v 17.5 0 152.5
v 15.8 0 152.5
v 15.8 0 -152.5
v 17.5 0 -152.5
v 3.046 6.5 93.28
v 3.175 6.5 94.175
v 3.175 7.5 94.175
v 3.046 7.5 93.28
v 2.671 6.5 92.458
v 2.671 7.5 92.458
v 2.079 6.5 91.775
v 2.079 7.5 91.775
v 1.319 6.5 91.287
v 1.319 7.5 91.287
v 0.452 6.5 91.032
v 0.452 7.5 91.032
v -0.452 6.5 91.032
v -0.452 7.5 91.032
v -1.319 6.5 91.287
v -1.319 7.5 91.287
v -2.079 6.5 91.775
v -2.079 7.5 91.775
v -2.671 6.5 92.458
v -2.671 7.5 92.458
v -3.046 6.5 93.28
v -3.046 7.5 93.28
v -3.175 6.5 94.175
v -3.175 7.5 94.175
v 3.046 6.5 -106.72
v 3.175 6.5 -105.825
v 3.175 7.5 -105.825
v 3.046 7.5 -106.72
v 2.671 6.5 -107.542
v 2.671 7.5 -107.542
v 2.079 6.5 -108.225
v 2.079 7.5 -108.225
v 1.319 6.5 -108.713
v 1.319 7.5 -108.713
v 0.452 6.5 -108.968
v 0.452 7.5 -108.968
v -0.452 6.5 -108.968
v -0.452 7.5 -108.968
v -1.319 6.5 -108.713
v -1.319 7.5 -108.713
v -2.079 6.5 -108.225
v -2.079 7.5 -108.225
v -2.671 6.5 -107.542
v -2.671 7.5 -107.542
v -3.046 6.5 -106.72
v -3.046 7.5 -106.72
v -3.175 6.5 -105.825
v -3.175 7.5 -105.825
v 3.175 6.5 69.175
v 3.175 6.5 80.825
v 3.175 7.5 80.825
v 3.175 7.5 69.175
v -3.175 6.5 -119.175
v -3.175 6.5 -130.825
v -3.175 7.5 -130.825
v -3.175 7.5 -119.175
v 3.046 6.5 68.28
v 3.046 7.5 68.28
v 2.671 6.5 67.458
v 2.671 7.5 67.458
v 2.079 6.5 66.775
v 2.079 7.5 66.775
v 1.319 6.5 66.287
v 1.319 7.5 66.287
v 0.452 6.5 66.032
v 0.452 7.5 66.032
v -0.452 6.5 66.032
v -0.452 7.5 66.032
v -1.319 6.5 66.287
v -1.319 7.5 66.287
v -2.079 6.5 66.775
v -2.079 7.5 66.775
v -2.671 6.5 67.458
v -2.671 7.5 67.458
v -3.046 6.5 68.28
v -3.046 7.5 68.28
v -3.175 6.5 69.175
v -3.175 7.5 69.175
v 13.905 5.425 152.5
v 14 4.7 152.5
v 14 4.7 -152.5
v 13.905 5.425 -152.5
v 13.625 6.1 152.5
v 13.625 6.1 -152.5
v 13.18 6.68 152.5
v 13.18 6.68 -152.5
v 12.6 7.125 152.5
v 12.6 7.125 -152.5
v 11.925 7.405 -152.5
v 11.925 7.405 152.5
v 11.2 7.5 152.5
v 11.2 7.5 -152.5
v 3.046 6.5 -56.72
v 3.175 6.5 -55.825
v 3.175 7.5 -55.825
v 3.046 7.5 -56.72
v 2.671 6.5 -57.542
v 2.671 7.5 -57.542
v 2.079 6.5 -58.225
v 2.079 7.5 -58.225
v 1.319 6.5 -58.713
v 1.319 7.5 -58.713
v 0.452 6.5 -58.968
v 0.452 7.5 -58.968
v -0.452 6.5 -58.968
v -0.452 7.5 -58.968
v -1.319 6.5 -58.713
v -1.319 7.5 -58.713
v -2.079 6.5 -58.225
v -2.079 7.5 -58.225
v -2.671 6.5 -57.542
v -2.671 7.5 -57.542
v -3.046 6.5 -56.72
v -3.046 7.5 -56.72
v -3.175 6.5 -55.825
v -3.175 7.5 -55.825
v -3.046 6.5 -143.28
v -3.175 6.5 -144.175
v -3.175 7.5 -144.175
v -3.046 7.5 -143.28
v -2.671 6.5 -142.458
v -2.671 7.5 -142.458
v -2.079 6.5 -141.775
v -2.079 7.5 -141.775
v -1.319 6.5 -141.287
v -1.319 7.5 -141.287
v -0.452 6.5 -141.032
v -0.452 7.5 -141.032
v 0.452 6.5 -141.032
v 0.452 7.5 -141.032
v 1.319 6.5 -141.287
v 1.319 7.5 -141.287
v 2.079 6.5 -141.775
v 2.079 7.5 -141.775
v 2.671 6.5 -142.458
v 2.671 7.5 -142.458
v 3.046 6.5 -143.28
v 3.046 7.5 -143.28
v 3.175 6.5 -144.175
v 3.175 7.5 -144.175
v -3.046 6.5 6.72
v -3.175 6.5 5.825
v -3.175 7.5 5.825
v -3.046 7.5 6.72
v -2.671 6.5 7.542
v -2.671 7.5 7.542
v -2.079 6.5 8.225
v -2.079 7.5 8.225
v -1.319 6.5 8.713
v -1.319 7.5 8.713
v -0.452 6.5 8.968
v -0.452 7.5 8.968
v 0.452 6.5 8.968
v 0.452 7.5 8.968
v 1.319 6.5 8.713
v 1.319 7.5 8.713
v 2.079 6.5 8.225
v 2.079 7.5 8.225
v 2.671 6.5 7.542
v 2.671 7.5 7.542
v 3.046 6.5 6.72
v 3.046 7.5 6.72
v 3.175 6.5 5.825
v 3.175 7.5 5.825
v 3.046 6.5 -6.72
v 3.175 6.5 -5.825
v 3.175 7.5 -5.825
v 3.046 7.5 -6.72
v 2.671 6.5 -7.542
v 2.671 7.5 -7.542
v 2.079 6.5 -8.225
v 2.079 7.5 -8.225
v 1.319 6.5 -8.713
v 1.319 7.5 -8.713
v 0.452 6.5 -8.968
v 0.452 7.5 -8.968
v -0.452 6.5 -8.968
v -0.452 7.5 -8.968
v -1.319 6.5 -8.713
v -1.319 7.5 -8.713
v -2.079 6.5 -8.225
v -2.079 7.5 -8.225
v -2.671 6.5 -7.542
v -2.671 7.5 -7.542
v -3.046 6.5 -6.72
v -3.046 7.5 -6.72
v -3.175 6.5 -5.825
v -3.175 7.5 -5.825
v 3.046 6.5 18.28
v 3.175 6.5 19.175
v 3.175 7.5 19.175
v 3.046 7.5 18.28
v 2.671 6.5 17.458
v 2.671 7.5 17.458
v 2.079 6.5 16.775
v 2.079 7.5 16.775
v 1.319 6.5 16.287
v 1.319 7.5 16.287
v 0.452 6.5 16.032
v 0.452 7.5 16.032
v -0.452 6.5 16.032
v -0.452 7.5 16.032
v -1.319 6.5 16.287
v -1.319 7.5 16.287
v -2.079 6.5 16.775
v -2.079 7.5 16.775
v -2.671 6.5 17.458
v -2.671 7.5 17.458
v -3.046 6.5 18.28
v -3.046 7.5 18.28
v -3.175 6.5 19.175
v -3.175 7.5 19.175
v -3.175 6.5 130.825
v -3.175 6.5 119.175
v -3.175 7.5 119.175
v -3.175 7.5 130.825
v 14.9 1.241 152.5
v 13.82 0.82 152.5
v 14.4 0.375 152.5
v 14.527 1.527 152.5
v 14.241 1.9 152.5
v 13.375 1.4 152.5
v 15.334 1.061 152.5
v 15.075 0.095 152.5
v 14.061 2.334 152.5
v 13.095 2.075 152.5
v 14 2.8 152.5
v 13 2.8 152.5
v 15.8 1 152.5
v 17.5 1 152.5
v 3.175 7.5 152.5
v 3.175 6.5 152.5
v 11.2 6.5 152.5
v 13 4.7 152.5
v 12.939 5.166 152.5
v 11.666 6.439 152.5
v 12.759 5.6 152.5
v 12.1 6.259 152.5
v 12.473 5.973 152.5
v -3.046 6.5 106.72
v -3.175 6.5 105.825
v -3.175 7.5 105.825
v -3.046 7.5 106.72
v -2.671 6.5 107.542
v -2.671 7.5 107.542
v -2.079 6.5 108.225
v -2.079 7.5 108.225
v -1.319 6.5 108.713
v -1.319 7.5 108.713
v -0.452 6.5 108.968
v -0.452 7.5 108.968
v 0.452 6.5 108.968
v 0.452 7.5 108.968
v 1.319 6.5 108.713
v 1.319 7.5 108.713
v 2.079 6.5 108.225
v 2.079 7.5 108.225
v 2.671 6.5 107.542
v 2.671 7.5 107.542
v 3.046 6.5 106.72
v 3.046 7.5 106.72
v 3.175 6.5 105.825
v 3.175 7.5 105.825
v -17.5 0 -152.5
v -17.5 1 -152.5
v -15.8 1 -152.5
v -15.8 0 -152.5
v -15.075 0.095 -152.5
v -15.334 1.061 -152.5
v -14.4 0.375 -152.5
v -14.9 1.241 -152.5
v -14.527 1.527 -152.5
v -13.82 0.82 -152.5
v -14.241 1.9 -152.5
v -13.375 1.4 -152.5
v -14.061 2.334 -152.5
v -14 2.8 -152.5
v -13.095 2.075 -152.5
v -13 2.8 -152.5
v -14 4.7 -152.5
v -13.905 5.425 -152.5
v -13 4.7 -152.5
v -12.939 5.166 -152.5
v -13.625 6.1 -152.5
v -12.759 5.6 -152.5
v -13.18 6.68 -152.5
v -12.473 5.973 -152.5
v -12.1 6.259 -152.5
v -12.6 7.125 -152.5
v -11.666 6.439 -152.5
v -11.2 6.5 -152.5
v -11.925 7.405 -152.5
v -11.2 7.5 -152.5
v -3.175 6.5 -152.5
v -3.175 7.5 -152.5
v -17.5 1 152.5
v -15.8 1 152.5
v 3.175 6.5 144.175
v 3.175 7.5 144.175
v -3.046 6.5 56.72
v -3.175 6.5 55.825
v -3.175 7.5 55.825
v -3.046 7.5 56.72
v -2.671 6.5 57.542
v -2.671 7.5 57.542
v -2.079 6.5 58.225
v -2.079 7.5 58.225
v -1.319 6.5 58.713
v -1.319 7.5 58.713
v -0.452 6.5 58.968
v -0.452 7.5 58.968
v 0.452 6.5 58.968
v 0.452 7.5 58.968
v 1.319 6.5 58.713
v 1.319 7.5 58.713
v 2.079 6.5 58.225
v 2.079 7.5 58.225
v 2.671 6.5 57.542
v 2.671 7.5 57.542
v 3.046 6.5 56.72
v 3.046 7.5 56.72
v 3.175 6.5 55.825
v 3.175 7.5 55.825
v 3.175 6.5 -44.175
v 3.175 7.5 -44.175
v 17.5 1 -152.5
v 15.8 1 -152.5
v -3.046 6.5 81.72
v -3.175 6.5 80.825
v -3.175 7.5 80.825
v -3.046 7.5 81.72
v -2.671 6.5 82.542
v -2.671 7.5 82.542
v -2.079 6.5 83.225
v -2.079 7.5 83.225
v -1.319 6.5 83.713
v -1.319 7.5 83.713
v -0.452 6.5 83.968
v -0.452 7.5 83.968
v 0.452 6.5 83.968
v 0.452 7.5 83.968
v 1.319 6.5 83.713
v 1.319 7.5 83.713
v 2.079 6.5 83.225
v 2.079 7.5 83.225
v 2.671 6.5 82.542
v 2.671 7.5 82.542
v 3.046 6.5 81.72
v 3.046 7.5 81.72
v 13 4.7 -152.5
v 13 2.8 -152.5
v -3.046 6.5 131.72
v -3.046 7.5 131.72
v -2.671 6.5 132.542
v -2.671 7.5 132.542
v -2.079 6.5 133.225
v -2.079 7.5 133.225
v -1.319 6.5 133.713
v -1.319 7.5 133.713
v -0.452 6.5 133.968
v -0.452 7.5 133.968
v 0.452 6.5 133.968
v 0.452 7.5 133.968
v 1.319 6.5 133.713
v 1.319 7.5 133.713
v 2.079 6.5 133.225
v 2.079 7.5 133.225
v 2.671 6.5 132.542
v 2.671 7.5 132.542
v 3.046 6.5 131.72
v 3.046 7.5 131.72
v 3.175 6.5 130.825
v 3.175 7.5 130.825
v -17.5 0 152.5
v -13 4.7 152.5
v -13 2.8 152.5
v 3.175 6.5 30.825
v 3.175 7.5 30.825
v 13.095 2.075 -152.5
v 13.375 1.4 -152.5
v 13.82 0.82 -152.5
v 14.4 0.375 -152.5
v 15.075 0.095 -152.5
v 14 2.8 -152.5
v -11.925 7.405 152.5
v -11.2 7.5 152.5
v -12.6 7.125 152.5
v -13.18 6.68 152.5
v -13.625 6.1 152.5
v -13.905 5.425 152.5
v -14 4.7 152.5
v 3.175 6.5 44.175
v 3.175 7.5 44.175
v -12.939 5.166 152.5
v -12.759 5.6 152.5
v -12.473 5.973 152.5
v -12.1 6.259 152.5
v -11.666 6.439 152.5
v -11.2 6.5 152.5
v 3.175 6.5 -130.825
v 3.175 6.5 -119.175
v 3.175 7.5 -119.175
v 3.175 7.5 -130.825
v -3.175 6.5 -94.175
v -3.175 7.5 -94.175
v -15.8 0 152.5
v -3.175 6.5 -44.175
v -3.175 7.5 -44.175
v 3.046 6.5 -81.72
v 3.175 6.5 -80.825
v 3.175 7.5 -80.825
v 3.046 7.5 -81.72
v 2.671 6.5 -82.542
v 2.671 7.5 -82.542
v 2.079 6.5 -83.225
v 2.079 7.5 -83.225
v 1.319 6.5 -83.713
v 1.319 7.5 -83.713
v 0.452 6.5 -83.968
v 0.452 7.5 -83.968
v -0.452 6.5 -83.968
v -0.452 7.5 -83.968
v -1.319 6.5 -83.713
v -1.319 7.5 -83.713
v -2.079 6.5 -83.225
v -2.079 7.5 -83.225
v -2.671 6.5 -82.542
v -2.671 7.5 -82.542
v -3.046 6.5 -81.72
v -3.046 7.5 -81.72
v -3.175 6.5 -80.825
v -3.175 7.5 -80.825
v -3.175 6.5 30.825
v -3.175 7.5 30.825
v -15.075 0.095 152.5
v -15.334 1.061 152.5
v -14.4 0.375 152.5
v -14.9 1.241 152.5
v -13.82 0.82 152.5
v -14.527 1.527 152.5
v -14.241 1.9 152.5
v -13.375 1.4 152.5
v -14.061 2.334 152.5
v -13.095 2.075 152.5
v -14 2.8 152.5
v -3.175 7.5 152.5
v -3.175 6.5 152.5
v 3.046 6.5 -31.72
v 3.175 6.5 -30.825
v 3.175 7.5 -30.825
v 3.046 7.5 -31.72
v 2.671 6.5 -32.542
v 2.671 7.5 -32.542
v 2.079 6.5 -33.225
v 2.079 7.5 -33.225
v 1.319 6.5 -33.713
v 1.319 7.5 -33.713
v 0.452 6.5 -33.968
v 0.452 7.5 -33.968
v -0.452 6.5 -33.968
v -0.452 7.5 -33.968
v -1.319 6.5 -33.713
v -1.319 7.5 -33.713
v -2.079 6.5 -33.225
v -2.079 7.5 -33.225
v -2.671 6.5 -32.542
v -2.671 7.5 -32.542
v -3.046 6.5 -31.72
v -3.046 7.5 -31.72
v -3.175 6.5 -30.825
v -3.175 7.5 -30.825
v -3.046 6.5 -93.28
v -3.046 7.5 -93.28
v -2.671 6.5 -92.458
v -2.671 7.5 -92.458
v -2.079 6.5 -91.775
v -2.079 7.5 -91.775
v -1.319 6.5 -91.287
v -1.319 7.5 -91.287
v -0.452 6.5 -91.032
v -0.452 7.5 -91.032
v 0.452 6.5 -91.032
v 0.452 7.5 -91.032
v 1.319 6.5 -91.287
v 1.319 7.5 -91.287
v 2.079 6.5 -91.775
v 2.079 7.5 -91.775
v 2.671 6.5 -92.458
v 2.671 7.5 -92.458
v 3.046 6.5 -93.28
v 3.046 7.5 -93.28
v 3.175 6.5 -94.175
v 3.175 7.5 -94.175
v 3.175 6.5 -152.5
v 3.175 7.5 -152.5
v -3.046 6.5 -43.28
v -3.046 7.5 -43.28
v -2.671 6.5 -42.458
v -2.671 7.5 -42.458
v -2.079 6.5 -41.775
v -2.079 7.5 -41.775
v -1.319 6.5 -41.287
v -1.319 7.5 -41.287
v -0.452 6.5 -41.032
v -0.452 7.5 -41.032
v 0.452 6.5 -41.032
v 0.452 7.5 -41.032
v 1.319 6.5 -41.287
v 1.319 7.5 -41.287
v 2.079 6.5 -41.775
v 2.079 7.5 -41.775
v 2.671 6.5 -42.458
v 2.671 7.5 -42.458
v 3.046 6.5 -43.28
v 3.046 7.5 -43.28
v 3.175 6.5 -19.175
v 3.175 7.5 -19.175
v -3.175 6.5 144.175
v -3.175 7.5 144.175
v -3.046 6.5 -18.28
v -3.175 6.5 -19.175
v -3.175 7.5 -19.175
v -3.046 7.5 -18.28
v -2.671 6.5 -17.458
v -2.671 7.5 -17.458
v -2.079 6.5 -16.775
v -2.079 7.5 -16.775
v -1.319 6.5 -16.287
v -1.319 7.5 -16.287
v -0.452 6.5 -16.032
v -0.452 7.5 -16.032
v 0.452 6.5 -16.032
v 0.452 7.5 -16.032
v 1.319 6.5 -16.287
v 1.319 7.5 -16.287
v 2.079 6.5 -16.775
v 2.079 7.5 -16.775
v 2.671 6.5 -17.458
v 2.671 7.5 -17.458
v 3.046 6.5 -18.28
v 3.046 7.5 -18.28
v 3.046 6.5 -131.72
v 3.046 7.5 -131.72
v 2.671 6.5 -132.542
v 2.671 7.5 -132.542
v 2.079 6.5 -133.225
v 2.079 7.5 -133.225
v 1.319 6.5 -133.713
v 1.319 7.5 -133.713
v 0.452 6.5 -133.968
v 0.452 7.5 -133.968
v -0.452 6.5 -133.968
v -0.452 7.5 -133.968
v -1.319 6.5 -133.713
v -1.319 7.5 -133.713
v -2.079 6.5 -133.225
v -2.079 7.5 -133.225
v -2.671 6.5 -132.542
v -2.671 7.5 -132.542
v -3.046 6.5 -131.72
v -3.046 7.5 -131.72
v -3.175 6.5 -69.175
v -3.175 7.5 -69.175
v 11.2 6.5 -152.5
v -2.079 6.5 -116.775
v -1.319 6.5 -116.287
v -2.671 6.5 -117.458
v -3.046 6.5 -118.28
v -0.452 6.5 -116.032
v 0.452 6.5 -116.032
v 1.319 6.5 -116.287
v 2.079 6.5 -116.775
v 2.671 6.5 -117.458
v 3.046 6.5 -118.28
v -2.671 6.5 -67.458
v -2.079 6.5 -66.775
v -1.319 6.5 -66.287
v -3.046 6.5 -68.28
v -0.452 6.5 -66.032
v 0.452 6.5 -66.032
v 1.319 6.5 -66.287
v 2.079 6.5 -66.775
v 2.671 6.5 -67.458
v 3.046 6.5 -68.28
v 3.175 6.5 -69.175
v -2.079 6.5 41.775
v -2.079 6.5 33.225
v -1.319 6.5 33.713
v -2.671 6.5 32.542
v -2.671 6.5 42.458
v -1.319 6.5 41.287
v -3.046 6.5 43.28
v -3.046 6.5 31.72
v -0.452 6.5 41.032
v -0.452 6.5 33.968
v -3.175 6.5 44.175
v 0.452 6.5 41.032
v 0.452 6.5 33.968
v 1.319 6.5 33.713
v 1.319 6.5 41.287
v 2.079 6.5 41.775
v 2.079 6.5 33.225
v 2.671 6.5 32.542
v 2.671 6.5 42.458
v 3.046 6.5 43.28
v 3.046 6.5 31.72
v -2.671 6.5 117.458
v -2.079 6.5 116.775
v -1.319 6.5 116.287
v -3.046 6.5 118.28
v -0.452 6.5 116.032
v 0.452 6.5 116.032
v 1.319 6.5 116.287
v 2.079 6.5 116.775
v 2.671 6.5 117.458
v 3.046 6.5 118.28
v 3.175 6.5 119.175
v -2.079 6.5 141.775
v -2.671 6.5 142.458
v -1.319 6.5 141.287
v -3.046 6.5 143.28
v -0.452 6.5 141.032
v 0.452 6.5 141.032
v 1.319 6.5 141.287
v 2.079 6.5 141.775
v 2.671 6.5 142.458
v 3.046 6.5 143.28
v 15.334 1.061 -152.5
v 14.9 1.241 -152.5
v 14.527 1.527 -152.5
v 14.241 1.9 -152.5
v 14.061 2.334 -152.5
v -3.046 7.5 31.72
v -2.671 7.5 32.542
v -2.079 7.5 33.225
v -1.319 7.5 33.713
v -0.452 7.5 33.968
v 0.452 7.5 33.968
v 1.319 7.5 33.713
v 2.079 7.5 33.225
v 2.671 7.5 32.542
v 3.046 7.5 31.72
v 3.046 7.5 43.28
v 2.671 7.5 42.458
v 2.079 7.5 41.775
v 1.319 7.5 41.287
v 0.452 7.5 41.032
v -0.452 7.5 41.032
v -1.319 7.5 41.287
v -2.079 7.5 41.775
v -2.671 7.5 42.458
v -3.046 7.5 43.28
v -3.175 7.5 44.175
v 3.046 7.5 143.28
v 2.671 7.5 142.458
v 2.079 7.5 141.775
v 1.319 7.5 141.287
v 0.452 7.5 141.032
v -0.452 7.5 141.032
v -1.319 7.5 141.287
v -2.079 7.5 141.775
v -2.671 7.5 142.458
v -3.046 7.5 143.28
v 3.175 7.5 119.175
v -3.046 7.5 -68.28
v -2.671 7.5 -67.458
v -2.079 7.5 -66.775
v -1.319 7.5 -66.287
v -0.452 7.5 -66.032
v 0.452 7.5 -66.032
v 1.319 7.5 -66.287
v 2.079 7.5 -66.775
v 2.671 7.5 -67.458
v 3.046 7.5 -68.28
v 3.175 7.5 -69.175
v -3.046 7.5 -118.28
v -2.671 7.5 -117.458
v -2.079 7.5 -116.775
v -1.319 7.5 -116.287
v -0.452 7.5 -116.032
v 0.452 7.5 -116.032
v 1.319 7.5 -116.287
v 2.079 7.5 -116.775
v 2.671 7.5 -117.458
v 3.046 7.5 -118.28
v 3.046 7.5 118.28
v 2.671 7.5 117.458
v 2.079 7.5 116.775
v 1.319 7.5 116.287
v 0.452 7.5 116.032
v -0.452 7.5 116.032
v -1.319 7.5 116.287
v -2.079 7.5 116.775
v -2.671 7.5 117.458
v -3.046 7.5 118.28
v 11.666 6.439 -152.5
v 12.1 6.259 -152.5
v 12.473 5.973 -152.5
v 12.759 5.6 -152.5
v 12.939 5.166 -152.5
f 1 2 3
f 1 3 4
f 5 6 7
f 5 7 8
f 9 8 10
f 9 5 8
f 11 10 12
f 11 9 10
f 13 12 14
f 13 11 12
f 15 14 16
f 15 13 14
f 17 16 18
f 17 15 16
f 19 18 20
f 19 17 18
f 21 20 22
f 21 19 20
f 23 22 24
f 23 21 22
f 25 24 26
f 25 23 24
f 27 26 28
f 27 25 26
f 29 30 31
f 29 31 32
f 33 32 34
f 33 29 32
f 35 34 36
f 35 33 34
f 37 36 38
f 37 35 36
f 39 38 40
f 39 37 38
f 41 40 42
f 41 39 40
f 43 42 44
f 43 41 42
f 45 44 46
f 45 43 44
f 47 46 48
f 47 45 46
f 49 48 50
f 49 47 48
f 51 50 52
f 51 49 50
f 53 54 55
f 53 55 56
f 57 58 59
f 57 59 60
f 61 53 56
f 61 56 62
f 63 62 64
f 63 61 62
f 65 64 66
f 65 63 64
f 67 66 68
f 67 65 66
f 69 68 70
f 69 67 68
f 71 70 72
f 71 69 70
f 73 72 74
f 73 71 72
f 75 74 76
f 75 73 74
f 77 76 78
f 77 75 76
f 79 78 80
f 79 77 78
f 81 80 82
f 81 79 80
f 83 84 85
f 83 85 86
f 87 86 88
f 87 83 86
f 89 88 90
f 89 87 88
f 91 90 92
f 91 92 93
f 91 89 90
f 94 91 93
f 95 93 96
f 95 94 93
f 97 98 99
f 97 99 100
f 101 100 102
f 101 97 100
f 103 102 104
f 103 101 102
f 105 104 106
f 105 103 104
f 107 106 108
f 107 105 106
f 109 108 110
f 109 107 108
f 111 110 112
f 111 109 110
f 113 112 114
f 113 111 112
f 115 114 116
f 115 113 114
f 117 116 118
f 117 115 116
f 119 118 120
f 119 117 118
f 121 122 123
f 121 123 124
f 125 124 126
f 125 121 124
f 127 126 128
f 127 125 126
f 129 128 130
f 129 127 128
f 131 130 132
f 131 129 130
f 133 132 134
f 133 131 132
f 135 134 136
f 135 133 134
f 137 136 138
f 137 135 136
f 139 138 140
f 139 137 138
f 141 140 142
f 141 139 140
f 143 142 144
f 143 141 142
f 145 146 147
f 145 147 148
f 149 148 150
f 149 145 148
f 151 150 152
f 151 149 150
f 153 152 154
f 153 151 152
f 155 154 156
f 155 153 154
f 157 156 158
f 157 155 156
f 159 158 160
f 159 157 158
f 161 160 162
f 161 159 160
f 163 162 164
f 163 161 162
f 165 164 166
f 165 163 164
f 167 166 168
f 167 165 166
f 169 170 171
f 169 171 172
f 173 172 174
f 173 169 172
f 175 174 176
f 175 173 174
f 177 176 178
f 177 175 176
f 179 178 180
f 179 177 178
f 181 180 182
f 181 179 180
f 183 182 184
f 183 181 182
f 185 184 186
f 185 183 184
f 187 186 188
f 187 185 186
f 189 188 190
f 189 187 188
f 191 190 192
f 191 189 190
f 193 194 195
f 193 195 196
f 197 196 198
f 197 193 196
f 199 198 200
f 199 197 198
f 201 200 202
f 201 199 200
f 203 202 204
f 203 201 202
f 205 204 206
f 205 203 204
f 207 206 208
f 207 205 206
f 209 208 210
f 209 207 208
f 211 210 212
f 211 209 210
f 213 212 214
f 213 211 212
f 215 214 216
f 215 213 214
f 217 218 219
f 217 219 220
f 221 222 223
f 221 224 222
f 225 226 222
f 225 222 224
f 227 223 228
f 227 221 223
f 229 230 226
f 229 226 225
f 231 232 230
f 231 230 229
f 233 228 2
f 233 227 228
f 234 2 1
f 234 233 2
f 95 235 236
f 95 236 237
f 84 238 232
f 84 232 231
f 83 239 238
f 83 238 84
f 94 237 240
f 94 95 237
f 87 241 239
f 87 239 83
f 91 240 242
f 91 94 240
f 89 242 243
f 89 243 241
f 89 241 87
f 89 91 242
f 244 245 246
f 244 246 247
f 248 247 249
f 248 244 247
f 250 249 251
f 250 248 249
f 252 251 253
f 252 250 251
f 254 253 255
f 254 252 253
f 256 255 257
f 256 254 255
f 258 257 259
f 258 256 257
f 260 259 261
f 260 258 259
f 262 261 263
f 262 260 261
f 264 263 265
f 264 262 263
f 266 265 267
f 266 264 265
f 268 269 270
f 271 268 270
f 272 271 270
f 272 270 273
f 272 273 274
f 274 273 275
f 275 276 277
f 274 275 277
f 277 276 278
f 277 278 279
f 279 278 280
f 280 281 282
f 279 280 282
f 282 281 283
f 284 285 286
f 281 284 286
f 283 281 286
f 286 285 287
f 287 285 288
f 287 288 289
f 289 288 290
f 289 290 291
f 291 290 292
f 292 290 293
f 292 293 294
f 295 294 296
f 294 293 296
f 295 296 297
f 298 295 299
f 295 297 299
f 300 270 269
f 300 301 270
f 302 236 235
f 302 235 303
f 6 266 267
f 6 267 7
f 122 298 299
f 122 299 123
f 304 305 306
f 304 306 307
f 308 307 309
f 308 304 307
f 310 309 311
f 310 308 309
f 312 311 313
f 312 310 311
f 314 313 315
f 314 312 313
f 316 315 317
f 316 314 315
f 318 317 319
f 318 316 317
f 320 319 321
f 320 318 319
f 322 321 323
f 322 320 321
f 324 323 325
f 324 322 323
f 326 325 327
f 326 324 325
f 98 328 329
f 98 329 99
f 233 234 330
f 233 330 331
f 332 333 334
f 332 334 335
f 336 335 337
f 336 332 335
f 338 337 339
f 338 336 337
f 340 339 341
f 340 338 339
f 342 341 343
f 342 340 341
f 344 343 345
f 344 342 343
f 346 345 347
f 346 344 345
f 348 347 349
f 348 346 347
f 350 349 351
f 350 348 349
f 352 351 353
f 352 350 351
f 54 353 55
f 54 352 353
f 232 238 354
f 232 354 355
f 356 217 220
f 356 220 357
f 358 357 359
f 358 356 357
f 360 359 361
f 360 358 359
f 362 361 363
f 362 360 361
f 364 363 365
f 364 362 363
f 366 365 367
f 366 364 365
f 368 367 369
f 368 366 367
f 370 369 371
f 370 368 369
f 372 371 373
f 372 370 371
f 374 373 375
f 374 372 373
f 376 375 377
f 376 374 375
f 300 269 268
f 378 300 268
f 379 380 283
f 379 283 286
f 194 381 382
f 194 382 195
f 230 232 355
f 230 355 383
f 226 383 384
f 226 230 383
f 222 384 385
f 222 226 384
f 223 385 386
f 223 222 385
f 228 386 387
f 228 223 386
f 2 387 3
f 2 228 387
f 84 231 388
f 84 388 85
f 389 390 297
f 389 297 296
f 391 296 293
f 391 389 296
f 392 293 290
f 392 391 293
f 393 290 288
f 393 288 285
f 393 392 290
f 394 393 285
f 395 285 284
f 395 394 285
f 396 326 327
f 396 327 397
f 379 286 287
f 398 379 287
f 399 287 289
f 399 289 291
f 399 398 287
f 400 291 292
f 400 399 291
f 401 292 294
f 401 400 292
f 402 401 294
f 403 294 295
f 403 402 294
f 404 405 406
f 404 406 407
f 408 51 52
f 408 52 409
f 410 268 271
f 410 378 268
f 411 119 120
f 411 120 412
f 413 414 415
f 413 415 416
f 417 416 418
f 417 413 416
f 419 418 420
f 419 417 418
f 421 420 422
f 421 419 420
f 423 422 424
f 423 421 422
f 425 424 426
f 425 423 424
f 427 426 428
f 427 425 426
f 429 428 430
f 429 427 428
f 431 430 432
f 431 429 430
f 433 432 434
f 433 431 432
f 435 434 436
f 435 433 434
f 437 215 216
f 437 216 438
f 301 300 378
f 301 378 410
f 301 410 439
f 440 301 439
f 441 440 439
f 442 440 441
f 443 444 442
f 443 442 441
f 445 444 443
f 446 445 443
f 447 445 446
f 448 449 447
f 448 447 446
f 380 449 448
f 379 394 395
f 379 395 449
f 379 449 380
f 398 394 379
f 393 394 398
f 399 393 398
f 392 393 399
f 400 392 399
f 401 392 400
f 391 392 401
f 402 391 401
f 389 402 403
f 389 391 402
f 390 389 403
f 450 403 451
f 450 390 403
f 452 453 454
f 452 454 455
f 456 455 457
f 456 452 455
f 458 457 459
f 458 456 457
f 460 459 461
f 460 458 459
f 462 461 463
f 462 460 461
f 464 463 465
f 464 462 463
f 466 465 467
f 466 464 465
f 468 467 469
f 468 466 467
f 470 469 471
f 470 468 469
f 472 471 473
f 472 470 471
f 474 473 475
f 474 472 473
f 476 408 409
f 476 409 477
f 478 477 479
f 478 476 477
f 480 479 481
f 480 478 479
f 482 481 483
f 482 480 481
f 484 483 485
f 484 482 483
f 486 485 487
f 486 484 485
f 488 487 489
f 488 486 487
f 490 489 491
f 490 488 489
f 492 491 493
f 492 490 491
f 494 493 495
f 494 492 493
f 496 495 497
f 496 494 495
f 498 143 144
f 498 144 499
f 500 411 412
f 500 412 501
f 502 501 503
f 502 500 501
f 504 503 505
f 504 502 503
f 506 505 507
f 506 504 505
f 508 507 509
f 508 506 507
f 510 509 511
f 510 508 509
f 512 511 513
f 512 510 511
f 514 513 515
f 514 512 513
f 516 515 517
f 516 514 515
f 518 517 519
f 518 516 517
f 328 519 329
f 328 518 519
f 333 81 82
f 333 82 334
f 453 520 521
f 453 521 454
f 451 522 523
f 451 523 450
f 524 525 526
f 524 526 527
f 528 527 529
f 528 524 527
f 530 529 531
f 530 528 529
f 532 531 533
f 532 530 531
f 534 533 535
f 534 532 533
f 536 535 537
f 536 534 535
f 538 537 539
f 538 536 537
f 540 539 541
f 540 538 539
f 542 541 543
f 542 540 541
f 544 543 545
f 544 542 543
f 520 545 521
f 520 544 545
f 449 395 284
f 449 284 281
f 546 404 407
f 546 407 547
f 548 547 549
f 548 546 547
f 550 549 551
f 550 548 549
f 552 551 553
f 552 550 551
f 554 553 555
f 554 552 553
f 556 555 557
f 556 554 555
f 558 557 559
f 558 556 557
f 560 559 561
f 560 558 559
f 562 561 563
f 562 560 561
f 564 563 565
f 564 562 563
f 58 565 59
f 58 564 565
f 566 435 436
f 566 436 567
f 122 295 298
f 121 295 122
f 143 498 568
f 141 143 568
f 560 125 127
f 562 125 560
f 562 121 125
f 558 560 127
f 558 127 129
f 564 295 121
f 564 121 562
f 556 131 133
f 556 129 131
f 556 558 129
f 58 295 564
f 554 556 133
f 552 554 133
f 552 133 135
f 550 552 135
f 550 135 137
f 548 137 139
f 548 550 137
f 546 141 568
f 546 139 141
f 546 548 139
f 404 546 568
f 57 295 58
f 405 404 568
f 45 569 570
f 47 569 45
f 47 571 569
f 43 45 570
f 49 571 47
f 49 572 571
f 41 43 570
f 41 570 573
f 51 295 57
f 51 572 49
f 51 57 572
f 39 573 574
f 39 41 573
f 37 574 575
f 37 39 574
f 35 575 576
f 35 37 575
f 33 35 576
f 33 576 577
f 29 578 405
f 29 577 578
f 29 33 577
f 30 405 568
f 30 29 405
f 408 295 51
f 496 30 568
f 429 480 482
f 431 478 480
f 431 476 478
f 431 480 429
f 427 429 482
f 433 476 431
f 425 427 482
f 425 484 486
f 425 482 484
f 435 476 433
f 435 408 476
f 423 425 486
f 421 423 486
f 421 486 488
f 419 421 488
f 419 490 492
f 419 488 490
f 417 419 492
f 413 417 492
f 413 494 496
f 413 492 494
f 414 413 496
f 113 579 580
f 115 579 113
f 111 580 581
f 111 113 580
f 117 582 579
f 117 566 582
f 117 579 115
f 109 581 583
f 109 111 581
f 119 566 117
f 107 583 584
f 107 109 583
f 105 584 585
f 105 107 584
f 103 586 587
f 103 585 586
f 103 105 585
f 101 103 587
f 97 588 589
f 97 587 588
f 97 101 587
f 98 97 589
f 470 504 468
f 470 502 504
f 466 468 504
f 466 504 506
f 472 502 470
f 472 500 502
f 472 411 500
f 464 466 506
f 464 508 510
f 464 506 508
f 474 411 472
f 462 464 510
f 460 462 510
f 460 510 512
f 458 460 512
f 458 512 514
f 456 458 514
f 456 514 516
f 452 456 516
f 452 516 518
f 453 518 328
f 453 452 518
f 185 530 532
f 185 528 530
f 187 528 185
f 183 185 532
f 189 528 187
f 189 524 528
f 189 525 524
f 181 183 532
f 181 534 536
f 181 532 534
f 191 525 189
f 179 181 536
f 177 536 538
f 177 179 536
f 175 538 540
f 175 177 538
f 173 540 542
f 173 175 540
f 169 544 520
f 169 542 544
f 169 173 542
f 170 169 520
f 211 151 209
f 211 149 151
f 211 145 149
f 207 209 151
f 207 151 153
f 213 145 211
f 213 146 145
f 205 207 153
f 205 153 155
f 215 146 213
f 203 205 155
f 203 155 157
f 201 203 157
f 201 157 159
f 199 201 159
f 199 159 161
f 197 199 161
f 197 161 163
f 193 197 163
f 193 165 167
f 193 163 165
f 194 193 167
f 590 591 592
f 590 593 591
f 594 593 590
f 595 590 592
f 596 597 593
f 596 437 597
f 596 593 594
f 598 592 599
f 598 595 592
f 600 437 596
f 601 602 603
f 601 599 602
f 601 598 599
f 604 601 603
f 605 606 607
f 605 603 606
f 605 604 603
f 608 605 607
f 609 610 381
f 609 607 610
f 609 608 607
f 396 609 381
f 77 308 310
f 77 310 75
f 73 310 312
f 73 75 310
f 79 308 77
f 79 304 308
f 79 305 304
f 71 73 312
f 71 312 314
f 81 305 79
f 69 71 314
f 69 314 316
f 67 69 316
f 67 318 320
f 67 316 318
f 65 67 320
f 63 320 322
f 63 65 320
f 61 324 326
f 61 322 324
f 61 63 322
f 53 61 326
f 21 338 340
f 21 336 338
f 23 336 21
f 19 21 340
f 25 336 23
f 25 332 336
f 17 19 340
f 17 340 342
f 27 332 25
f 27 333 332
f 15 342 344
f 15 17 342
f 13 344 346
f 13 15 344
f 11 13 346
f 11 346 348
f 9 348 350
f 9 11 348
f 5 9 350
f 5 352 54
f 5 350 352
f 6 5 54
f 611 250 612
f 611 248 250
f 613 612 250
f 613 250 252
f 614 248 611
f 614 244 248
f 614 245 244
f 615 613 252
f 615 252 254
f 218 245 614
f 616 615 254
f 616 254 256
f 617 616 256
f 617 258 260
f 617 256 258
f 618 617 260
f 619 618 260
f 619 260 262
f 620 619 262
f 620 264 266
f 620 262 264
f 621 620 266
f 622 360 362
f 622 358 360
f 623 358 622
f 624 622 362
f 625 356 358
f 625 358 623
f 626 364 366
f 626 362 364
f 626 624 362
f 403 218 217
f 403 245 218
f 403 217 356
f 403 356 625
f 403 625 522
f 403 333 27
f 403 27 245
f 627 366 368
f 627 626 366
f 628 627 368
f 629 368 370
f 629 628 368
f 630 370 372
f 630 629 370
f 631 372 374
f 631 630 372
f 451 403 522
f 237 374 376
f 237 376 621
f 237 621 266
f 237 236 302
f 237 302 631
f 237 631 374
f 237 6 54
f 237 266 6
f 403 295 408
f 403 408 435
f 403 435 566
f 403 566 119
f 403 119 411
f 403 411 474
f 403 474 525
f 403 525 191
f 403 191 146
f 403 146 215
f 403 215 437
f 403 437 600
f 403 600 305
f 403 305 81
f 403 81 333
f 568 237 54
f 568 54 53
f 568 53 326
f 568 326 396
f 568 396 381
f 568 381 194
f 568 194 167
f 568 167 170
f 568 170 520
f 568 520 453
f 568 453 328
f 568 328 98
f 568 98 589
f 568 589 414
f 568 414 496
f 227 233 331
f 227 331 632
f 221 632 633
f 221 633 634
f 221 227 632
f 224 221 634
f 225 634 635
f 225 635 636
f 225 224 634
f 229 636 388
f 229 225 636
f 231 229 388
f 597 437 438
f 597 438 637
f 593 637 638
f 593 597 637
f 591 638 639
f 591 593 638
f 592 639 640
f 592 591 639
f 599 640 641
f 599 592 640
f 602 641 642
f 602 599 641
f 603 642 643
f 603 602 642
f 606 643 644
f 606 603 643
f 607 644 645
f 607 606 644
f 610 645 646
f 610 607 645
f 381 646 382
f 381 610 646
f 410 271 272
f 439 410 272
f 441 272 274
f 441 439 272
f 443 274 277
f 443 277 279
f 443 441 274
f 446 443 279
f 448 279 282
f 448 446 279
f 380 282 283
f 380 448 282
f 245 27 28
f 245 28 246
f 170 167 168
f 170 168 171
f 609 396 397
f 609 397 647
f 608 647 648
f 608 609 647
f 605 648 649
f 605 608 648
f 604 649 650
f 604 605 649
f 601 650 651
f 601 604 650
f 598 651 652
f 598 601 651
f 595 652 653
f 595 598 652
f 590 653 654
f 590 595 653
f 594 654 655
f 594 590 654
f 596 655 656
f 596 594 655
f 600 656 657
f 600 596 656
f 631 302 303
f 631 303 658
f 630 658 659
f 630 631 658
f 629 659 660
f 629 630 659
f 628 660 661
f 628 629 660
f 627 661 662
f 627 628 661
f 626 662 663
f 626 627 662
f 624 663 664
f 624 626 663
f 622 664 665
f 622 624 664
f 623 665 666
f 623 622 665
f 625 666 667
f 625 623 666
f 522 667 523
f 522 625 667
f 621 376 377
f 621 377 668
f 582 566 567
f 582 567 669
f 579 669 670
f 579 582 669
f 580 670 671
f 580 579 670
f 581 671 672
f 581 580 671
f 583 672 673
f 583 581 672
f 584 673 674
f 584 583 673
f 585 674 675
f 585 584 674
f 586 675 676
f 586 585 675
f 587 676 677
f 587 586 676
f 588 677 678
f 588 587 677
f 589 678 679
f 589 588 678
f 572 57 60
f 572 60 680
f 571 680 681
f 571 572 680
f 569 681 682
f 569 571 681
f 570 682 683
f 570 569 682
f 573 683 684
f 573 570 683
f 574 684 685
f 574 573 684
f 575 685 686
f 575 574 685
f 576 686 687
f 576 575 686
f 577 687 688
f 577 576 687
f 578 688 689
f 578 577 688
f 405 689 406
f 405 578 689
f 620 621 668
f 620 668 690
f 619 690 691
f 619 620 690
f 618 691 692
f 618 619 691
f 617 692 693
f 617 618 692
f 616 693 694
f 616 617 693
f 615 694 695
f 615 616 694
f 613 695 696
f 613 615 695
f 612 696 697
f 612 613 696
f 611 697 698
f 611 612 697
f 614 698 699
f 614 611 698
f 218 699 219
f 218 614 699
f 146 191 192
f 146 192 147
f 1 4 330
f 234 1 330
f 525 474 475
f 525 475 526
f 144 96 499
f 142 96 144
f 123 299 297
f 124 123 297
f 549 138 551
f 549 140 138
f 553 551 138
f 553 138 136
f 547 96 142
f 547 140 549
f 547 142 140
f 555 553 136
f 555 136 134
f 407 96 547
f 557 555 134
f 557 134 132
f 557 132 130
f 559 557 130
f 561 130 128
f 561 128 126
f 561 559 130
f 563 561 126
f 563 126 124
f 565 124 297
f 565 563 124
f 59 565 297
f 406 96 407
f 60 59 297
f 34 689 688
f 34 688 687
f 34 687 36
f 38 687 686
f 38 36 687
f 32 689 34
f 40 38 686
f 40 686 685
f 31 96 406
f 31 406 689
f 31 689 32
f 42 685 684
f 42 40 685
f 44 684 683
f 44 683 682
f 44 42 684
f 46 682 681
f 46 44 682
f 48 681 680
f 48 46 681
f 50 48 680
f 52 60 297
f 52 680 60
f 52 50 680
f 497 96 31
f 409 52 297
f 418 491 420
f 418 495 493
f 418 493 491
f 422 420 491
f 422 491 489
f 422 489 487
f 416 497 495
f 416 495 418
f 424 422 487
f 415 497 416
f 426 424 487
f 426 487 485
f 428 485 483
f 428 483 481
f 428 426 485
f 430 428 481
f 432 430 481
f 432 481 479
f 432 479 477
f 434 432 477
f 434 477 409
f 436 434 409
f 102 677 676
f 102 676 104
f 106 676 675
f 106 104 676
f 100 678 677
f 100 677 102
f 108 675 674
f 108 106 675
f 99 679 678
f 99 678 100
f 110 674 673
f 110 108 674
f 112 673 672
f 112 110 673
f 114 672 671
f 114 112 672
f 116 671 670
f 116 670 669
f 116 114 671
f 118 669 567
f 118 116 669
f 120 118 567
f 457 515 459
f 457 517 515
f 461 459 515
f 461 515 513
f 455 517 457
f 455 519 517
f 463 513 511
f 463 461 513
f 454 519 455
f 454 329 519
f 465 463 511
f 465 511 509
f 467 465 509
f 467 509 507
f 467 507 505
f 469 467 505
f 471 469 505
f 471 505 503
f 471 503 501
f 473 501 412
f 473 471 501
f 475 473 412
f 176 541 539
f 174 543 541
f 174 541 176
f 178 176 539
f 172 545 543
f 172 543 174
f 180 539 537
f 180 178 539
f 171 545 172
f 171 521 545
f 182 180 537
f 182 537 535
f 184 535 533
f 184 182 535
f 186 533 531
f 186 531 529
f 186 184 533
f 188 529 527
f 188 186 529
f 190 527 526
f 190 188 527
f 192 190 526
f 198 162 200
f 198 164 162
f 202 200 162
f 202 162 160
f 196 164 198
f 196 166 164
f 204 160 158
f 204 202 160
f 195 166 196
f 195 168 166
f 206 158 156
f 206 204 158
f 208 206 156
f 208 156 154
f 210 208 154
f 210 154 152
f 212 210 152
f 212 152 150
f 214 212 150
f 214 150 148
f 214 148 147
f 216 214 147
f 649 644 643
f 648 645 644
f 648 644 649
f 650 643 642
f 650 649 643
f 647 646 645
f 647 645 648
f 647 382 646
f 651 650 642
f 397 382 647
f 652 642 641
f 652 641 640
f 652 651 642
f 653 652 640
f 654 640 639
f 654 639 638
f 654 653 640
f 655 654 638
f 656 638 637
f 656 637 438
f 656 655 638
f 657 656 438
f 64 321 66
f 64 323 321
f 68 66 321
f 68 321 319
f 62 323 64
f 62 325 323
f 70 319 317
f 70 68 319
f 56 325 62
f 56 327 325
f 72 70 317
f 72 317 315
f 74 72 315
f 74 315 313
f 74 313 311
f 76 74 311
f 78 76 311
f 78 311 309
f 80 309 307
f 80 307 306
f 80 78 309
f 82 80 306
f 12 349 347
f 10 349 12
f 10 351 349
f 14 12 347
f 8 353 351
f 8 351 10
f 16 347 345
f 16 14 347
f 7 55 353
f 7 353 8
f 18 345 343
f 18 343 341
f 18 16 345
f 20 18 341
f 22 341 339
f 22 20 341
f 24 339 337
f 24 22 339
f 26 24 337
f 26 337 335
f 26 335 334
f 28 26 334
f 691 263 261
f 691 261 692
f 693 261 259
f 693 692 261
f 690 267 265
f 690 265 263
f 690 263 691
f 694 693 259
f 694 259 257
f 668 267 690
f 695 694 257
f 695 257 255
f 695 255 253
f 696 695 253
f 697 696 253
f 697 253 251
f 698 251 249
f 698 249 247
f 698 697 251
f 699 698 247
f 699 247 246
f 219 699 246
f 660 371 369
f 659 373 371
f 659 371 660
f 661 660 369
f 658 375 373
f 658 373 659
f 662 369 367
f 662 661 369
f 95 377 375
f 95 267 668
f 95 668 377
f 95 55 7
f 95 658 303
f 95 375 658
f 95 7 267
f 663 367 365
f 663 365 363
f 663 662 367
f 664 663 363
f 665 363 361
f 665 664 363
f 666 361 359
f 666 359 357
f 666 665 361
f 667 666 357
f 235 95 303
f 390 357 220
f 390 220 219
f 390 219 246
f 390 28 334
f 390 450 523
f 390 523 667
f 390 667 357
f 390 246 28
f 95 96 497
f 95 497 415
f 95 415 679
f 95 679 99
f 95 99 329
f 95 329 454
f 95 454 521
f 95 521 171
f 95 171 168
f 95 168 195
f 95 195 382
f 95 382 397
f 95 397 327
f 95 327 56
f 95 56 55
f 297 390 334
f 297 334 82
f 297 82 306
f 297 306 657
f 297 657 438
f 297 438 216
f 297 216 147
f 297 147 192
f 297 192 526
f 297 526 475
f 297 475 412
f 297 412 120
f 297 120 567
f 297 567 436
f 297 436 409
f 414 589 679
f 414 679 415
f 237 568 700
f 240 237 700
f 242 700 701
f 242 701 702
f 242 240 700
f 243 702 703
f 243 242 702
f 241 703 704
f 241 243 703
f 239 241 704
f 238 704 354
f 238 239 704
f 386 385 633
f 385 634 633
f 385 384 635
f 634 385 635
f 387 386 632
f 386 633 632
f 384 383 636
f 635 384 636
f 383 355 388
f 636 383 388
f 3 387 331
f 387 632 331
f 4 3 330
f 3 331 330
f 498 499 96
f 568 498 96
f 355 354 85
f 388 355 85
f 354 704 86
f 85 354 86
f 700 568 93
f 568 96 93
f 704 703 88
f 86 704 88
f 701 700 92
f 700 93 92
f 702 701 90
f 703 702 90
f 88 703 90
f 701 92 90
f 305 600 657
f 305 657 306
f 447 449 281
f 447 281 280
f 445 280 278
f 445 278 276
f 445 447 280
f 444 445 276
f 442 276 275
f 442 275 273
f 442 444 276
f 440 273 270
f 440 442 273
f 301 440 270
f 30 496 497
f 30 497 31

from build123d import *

# Parameters (mm, degrees)
EXTRUDE_MAIN_DEPTH     = 152.5
SLOT_CUT_DEPTH         = 8.5
SLOT_PATTERN_COUNT     = 7
SLOT_PATTERN_PITCH     = 25
SLOT_PATTERN_COL_COUNT = 7
SLOT_PATTERN_COL_PITCH = 25


with BuildPart() as part:
    # Sketch1 → Extrude_main (new body, symmetric)
    with BuildSketch(Plane.XY):
        with BuildLine():
            Line((-17.5, 0), (-15.8, 0))
            ThreePointArc((-15.8, 0), (-13.820101013, 0.820101013), (-13, 2.8))
            Line((-13, 2.8), (-13, 4.7))
            ThreePointArc((-13, 4.7), (-12.472792206, 5.972792206), (-11.2, 6.5))
            Line((-11.2, 6.5), (11.2, 6.5))
            ThreePointArc((11.2, 6.5), (12.472792206, 5.972792206), (13, 4.7))
            Line((13, 4.7), (13, 2.8))
            ThreePointArc((13, 2.8), (13.820101013, 0.820101013), (15.8, 0))
            Line((15.8, 0), (17.5, 0))
            Line((17.5, 0), (17.5, 1))
            Line((17.5, 1), (15.8, 1))
            ThreePointArc((15.8, 1), (14.527207794, 1.527207794), (14, 2.8))
            Line((14, 2.8), (14, 4.7))
            ThreePointArc((14, 4.7), (13.179898987, 6.679898987), (11.2, 7.5))
            Line((11.2, 7.5), (-11.2, 7.5))
            ThreePointArc((-11.2, 7.5), (-13.179898987, 6.679898987), (-14, 4.7))
            Line((-14, 4.7), (-14, 2.8))
            ThreePointArc((-14, 2.8), (-14.527207794, 1.527207794), (-15.8, 1))
            Line((-15.8, 1), (-17.5, 1))
            Line((-17.5, 1), (-17.5, 0))
        make_face()
    extrude(amount=EXTRUDE_MAIN_DEPTH, both=True)

    # Sketch2 → slot_cut (cut, through all)
    with BuildSketch(Plane(origin=(0, 0, 0), x_dir=(1, 0, 0), z_dir=(0, 1, 0))):
        with BuildLine():
            Line((-3.175, 5.825), (-3.175, -5.825))
            ThreePointArc((-3.175, -5.825), (0, -9), (3.175, -5.825))
            Line((3.175, -5.825), (3.175, 5.825))
            ThreePointArc((3.175, 5.825), (0, 9), (-3.175, 5.825))
        make_face()
    slot_cut = extrude(amount=SLOT_CUT_DEPTH, mode=Mode.SUBTRACT)

    # slot_pattern: slot_cut ×7
    with Locations(*[(0, 0, i * SLOT_PATTERN_PITCH) for i in range(1, SLOT_PATTERN_COUNT)]):
        add(slot_cut, mode=Mode.SUBTRACT)

    # slot_pattern col: slot_cut ×7
    with Locations(*[(0, 0, -i * SLOT_PATTERN_COL_PITCH) for i in range(1, SLOT_PATTERN_COL_COUNT)]):
        add(slot_cut, mode=Mode.SUBTRACT)


solid = part.part
